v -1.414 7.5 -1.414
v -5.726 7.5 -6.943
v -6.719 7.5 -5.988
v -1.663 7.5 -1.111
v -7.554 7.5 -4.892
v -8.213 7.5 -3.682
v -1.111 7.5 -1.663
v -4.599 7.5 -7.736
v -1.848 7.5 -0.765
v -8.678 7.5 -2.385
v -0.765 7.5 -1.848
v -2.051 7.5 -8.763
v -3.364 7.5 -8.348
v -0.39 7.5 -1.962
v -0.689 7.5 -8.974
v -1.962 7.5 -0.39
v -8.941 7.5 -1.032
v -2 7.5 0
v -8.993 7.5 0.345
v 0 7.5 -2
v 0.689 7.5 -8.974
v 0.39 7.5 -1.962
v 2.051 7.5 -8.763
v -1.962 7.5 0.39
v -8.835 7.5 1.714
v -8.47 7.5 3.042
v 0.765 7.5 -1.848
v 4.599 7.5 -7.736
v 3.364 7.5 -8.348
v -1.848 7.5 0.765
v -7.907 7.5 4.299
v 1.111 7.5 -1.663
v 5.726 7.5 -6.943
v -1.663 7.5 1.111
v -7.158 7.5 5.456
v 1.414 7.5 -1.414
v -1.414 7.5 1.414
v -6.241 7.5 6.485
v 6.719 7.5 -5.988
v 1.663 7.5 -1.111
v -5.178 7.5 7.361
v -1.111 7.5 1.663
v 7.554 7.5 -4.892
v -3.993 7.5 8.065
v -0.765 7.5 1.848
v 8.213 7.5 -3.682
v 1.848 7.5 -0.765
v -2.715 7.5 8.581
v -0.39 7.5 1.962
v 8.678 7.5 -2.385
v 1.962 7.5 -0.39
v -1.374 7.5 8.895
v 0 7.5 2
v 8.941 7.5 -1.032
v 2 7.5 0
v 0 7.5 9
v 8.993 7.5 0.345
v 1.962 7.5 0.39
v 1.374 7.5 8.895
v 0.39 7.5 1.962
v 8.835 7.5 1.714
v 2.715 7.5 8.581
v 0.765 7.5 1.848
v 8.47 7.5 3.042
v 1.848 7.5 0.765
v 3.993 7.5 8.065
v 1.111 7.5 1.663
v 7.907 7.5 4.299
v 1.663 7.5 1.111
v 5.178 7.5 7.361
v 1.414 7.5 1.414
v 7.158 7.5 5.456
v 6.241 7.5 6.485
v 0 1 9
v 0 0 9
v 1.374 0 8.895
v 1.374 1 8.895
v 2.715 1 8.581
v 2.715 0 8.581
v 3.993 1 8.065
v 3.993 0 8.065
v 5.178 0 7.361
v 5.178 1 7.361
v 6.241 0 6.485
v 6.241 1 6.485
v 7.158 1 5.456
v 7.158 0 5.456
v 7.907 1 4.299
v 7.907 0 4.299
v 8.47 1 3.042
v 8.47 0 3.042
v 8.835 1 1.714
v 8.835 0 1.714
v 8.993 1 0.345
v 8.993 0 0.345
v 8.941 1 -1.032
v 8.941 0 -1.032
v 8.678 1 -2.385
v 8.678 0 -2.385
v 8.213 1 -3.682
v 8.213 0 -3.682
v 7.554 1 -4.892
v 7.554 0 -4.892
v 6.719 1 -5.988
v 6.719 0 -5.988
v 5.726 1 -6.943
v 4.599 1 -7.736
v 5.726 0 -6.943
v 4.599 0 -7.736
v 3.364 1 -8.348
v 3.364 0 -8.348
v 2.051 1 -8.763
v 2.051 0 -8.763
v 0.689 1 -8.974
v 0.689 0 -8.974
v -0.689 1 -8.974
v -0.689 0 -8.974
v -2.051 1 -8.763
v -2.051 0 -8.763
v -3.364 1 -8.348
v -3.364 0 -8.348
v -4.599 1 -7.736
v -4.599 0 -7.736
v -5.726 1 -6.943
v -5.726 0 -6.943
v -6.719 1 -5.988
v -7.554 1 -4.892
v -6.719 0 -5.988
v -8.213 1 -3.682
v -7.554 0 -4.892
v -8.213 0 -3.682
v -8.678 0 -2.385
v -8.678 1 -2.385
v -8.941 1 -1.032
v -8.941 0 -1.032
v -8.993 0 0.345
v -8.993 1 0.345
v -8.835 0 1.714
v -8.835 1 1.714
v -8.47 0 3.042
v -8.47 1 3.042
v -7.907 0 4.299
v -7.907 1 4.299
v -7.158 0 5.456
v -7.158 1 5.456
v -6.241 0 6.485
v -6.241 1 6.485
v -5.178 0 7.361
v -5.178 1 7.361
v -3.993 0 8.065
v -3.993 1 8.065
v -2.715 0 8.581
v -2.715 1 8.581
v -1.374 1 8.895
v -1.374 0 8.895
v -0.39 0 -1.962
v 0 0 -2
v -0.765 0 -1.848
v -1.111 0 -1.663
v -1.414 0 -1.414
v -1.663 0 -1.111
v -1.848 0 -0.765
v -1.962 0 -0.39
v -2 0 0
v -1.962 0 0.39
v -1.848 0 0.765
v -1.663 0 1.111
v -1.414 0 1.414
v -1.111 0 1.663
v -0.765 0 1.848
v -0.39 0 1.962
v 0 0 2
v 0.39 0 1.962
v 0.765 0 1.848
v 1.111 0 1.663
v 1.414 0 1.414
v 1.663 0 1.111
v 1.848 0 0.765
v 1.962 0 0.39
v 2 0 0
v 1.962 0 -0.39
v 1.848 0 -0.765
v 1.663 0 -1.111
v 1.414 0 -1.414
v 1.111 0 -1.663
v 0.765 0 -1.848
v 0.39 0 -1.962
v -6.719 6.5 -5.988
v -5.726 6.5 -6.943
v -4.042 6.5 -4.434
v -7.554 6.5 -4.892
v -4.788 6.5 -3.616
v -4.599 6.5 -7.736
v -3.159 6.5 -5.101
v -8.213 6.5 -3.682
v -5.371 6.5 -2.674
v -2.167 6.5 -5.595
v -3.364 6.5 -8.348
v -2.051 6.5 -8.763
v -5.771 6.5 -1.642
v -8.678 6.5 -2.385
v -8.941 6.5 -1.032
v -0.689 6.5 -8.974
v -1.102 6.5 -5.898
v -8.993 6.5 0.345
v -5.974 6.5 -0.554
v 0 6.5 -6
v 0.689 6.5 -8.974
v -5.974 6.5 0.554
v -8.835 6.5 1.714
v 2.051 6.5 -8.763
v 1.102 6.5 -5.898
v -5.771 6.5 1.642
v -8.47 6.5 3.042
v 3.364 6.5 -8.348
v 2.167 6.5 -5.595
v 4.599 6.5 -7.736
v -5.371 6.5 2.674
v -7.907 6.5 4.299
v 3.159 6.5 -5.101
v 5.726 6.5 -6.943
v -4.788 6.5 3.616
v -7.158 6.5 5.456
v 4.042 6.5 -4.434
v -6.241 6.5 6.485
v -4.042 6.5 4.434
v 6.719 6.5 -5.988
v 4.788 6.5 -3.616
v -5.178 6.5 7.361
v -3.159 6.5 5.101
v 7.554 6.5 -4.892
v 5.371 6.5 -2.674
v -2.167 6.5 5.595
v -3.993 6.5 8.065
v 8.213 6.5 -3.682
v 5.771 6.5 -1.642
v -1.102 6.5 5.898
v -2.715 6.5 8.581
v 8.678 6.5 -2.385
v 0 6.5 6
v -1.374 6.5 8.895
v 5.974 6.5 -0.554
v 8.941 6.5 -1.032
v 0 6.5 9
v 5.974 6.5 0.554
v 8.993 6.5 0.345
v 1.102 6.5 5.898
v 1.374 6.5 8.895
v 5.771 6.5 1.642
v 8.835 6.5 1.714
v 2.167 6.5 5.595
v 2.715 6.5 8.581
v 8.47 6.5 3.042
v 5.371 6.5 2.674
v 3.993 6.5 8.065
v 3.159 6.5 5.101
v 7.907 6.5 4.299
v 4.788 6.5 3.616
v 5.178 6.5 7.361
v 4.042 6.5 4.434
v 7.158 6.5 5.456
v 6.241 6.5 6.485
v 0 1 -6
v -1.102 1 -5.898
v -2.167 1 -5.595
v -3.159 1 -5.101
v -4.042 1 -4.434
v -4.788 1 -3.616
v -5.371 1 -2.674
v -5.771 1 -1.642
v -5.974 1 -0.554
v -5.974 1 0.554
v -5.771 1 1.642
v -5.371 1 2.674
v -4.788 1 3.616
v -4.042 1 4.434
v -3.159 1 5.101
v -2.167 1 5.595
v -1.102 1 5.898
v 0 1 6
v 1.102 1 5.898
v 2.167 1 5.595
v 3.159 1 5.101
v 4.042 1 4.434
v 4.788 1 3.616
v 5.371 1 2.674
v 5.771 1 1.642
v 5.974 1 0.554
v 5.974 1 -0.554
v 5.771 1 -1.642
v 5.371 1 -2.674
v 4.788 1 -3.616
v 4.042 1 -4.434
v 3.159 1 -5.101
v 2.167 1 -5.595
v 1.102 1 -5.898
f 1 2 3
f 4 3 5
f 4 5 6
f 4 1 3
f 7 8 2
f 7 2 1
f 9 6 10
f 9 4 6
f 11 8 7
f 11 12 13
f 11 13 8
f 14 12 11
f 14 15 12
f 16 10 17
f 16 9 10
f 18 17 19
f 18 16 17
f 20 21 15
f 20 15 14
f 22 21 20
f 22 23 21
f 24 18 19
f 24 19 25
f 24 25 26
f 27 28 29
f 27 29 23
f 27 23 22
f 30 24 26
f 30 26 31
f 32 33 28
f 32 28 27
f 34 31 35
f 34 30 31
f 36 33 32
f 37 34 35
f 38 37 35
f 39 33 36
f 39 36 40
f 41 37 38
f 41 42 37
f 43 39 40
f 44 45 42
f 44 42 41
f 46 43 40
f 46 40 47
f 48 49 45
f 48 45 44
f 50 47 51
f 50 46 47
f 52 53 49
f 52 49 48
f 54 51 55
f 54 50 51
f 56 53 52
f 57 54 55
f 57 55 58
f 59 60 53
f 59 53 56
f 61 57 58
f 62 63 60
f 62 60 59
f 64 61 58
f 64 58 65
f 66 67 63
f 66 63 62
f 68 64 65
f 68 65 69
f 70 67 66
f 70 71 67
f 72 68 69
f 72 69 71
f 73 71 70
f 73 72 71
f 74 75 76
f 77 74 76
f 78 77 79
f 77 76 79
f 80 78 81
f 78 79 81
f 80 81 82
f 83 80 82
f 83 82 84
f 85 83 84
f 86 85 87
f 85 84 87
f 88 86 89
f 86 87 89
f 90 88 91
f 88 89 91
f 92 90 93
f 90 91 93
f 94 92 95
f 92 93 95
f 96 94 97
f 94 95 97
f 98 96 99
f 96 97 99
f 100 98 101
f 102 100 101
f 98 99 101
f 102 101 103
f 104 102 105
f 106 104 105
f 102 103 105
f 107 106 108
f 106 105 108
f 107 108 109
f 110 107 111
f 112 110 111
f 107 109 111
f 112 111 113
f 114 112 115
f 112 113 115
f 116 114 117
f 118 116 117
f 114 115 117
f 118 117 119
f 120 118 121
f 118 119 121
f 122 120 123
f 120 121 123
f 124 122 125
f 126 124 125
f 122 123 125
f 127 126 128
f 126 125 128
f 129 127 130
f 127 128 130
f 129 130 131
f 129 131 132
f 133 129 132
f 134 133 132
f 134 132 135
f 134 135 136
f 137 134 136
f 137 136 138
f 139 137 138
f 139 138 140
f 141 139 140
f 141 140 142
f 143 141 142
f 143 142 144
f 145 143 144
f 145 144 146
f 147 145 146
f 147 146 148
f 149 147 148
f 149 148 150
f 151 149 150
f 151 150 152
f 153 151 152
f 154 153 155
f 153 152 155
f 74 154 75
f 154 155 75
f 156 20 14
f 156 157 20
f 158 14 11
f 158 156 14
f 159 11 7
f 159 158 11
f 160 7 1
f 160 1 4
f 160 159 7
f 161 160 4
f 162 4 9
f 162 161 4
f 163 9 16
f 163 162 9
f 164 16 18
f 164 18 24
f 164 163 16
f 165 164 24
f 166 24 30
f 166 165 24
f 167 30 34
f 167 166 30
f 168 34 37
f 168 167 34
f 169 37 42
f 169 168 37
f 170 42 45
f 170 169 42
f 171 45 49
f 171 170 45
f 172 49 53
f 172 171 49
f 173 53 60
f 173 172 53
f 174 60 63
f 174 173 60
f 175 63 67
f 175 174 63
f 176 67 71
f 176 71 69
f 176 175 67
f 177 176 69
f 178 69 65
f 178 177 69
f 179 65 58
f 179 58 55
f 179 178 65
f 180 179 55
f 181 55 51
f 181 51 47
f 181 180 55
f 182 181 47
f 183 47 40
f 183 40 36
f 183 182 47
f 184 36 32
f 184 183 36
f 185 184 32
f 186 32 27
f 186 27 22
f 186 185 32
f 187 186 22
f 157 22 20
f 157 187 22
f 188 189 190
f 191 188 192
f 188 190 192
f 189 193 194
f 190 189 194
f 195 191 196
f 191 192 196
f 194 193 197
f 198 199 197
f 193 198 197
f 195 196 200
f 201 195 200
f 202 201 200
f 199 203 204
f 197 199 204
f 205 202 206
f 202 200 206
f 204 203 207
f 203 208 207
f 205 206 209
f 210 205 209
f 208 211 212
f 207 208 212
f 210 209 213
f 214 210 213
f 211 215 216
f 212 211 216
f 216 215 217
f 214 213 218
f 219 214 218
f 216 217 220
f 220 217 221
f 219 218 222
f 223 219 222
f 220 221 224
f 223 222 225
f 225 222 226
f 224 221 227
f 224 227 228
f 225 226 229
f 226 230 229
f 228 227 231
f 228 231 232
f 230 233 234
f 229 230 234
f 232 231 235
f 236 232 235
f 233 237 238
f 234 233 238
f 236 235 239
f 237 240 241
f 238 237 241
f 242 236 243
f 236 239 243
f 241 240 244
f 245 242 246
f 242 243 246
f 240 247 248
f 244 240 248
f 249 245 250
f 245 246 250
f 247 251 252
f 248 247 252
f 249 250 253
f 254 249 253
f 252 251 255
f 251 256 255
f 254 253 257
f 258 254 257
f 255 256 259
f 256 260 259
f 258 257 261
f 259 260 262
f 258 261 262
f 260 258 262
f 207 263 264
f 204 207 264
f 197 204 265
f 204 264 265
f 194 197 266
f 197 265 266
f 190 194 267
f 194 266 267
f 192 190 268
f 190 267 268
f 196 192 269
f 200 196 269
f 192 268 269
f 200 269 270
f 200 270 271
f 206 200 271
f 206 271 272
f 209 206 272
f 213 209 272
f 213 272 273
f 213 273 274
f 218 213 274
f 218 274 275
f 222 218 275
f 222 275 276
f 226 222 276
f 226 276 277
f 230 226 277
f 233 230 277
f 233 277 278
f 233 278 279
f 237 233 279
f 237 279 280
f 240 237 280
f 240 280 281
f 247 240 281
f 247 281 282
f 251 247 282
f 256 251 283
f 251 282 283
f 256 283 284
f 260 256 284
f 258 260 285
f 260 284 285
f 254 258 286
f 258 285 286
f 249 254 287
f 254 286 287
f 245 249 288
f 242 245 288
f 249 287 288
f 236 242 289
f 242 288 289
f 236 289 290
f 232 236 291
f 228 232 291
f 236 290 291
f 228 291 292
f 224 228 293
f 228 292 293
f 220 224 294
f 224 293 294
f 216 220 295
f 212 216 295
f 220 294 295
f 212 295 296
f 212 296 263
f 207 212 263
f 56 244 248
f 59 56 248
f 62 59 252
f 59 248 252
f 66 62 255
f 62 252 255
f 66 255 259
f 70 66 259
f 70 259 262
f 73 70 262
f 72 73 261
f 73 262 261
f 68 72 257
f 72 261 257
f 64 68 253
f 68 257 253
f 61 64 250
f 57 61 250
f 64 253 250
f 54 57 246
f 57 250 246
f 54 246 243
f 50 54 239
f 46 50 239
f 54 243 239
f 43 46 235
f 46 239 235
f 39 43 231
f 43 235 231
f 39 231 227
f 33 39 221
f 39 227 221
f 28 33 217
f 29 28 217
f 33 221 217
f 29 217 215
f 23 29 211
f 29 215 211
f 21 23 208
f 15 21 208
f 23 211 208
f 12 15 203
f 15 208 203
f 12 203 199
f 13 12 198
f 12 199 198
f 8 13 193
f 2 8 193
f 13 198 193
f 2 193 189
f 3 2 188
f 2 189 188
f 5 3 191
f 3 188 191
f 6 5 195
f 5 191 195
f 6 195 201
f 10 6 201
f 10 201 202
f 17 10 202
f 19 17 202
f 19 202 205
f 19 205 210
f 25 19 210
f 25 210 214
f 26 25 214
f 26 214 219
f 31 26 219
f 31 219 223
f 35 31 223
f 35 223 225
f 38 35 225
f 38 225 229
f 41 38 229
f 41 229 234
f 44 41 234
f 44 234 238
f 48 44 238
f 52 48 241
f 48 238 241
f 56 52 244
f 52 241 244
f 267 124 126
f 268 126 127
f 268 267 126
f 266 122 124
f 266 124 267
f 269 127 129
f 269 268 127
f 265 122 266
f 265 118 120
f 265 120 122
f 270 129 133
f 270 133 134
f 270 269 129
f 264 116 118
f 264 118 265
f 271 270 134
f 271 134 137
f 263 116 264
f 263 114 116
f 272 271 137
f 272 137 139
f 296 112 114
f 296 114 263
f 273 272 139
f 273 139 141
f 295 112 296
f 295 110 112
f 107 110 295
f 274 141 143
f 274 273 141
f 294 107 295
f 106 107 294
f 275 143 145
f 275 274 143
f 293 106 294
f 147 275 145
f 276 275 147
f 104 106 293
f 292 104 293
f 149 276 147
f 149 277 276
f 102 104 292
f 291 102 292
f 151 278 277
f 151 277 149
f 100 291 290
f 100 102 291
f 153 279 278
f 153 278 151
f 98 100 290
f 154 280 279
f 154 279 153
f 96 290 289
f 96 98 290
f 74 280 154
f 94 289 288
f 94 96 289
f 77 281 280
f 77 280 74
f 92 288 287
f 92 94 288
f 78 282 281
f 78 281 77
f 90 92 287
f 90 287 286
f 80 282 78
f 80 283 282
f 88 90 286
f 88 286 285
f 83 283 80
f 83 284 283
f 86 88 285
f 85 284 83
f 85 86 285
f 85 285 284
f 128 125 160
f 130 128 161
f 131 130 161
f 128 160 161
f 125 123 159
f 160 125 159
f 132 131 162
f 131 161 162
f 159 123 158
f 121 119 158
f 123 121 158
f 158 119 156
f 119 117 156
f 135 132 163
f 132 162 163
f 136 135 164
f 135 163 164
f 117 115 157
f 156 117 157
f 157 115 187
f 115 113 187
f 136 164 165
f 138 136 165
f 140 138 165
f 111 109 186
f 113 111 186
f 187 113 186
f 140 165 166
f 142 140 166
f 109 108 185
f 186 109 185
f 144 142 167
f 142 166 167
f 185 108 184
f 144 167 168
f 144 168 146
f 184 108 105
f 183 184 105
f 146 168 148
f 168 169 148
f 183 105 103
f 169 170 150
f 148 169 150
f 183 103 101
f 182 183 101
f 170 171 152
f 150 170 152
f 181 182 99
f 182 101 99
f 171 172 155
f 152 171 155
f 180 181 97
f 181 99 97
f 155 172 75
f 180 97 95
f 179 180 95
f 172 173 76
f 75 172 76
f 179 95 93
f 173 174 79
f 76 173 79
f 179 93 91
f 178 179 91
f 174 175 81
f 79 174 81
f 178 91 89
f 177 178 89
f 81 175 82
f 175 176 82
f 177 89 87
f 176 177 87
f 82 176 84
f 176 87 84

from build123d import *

# Parameters (mm, degrees)
SKIZZE1_R                       = 9
SKIZZE1_R_2                     = 6
AUFSATZ_LINEAR_AUSTRAGEN1_DEPTH = 1
SKIZZE1_3_R                     = 6
SKIZZE1_3_R_2                   = 2
AUFSATZ_LINEAR_AUSTRAGEN2_DEPTH = 6.5
SKIZZE2_R                       = 9
SKIZZE2_R_2                     = 2
AUFSATZ_LINEAR_AUSTRAGEN3_DEPTH = 1


with BuildPart() as part:
    # Skizze1 → Aufsatz-Linear austragen1 (new body)
    with BuildSketch(Plane(origin=(0, 0, 0), x_dir=(1, 0, 0), z_dir=(0, 1, 0))):
        Circle(SKIZZE1_R)
        Circle(SKIZZE1_R_2, mode=Mode.SUBTRACT)
    extrude(amount=AUFSATZ_LINEAR_AUSTRAGEN1_DEPTH)

    # Skizze1<3> → Aufsatz-Linear austragen2 (add)
    with BuildSketch(Plane(origin=(0, 0, 0), x_dir=(1, 0, 0), z_dir=(0, 1, 0))):
        Circle(SKIZZE1_3_R)
        Circle(SKIZZE1_3_R_2, mode=Mode.SUBTRACT)
    extrude(amount=AUFSATZ_LINEAR_AUSTRAGEN2_DEPTH)

    # Skizze2 → Aufsatz-Linear austragen3 (add)
    with BuildSketch(Plane(origin=(0, 6.5, 0), x_dir=(1, 0, 0), z_dir=(0, 1, 0))):
        Circle(SKIZZE2_R)
        Circle(SKIZZE2_R_2, mode=Mode.SUBTRACT)
    extrude(amount=AUFSATZ_LINEAR_AUSTRAGEN3_DEPTH)


solid = part.part
